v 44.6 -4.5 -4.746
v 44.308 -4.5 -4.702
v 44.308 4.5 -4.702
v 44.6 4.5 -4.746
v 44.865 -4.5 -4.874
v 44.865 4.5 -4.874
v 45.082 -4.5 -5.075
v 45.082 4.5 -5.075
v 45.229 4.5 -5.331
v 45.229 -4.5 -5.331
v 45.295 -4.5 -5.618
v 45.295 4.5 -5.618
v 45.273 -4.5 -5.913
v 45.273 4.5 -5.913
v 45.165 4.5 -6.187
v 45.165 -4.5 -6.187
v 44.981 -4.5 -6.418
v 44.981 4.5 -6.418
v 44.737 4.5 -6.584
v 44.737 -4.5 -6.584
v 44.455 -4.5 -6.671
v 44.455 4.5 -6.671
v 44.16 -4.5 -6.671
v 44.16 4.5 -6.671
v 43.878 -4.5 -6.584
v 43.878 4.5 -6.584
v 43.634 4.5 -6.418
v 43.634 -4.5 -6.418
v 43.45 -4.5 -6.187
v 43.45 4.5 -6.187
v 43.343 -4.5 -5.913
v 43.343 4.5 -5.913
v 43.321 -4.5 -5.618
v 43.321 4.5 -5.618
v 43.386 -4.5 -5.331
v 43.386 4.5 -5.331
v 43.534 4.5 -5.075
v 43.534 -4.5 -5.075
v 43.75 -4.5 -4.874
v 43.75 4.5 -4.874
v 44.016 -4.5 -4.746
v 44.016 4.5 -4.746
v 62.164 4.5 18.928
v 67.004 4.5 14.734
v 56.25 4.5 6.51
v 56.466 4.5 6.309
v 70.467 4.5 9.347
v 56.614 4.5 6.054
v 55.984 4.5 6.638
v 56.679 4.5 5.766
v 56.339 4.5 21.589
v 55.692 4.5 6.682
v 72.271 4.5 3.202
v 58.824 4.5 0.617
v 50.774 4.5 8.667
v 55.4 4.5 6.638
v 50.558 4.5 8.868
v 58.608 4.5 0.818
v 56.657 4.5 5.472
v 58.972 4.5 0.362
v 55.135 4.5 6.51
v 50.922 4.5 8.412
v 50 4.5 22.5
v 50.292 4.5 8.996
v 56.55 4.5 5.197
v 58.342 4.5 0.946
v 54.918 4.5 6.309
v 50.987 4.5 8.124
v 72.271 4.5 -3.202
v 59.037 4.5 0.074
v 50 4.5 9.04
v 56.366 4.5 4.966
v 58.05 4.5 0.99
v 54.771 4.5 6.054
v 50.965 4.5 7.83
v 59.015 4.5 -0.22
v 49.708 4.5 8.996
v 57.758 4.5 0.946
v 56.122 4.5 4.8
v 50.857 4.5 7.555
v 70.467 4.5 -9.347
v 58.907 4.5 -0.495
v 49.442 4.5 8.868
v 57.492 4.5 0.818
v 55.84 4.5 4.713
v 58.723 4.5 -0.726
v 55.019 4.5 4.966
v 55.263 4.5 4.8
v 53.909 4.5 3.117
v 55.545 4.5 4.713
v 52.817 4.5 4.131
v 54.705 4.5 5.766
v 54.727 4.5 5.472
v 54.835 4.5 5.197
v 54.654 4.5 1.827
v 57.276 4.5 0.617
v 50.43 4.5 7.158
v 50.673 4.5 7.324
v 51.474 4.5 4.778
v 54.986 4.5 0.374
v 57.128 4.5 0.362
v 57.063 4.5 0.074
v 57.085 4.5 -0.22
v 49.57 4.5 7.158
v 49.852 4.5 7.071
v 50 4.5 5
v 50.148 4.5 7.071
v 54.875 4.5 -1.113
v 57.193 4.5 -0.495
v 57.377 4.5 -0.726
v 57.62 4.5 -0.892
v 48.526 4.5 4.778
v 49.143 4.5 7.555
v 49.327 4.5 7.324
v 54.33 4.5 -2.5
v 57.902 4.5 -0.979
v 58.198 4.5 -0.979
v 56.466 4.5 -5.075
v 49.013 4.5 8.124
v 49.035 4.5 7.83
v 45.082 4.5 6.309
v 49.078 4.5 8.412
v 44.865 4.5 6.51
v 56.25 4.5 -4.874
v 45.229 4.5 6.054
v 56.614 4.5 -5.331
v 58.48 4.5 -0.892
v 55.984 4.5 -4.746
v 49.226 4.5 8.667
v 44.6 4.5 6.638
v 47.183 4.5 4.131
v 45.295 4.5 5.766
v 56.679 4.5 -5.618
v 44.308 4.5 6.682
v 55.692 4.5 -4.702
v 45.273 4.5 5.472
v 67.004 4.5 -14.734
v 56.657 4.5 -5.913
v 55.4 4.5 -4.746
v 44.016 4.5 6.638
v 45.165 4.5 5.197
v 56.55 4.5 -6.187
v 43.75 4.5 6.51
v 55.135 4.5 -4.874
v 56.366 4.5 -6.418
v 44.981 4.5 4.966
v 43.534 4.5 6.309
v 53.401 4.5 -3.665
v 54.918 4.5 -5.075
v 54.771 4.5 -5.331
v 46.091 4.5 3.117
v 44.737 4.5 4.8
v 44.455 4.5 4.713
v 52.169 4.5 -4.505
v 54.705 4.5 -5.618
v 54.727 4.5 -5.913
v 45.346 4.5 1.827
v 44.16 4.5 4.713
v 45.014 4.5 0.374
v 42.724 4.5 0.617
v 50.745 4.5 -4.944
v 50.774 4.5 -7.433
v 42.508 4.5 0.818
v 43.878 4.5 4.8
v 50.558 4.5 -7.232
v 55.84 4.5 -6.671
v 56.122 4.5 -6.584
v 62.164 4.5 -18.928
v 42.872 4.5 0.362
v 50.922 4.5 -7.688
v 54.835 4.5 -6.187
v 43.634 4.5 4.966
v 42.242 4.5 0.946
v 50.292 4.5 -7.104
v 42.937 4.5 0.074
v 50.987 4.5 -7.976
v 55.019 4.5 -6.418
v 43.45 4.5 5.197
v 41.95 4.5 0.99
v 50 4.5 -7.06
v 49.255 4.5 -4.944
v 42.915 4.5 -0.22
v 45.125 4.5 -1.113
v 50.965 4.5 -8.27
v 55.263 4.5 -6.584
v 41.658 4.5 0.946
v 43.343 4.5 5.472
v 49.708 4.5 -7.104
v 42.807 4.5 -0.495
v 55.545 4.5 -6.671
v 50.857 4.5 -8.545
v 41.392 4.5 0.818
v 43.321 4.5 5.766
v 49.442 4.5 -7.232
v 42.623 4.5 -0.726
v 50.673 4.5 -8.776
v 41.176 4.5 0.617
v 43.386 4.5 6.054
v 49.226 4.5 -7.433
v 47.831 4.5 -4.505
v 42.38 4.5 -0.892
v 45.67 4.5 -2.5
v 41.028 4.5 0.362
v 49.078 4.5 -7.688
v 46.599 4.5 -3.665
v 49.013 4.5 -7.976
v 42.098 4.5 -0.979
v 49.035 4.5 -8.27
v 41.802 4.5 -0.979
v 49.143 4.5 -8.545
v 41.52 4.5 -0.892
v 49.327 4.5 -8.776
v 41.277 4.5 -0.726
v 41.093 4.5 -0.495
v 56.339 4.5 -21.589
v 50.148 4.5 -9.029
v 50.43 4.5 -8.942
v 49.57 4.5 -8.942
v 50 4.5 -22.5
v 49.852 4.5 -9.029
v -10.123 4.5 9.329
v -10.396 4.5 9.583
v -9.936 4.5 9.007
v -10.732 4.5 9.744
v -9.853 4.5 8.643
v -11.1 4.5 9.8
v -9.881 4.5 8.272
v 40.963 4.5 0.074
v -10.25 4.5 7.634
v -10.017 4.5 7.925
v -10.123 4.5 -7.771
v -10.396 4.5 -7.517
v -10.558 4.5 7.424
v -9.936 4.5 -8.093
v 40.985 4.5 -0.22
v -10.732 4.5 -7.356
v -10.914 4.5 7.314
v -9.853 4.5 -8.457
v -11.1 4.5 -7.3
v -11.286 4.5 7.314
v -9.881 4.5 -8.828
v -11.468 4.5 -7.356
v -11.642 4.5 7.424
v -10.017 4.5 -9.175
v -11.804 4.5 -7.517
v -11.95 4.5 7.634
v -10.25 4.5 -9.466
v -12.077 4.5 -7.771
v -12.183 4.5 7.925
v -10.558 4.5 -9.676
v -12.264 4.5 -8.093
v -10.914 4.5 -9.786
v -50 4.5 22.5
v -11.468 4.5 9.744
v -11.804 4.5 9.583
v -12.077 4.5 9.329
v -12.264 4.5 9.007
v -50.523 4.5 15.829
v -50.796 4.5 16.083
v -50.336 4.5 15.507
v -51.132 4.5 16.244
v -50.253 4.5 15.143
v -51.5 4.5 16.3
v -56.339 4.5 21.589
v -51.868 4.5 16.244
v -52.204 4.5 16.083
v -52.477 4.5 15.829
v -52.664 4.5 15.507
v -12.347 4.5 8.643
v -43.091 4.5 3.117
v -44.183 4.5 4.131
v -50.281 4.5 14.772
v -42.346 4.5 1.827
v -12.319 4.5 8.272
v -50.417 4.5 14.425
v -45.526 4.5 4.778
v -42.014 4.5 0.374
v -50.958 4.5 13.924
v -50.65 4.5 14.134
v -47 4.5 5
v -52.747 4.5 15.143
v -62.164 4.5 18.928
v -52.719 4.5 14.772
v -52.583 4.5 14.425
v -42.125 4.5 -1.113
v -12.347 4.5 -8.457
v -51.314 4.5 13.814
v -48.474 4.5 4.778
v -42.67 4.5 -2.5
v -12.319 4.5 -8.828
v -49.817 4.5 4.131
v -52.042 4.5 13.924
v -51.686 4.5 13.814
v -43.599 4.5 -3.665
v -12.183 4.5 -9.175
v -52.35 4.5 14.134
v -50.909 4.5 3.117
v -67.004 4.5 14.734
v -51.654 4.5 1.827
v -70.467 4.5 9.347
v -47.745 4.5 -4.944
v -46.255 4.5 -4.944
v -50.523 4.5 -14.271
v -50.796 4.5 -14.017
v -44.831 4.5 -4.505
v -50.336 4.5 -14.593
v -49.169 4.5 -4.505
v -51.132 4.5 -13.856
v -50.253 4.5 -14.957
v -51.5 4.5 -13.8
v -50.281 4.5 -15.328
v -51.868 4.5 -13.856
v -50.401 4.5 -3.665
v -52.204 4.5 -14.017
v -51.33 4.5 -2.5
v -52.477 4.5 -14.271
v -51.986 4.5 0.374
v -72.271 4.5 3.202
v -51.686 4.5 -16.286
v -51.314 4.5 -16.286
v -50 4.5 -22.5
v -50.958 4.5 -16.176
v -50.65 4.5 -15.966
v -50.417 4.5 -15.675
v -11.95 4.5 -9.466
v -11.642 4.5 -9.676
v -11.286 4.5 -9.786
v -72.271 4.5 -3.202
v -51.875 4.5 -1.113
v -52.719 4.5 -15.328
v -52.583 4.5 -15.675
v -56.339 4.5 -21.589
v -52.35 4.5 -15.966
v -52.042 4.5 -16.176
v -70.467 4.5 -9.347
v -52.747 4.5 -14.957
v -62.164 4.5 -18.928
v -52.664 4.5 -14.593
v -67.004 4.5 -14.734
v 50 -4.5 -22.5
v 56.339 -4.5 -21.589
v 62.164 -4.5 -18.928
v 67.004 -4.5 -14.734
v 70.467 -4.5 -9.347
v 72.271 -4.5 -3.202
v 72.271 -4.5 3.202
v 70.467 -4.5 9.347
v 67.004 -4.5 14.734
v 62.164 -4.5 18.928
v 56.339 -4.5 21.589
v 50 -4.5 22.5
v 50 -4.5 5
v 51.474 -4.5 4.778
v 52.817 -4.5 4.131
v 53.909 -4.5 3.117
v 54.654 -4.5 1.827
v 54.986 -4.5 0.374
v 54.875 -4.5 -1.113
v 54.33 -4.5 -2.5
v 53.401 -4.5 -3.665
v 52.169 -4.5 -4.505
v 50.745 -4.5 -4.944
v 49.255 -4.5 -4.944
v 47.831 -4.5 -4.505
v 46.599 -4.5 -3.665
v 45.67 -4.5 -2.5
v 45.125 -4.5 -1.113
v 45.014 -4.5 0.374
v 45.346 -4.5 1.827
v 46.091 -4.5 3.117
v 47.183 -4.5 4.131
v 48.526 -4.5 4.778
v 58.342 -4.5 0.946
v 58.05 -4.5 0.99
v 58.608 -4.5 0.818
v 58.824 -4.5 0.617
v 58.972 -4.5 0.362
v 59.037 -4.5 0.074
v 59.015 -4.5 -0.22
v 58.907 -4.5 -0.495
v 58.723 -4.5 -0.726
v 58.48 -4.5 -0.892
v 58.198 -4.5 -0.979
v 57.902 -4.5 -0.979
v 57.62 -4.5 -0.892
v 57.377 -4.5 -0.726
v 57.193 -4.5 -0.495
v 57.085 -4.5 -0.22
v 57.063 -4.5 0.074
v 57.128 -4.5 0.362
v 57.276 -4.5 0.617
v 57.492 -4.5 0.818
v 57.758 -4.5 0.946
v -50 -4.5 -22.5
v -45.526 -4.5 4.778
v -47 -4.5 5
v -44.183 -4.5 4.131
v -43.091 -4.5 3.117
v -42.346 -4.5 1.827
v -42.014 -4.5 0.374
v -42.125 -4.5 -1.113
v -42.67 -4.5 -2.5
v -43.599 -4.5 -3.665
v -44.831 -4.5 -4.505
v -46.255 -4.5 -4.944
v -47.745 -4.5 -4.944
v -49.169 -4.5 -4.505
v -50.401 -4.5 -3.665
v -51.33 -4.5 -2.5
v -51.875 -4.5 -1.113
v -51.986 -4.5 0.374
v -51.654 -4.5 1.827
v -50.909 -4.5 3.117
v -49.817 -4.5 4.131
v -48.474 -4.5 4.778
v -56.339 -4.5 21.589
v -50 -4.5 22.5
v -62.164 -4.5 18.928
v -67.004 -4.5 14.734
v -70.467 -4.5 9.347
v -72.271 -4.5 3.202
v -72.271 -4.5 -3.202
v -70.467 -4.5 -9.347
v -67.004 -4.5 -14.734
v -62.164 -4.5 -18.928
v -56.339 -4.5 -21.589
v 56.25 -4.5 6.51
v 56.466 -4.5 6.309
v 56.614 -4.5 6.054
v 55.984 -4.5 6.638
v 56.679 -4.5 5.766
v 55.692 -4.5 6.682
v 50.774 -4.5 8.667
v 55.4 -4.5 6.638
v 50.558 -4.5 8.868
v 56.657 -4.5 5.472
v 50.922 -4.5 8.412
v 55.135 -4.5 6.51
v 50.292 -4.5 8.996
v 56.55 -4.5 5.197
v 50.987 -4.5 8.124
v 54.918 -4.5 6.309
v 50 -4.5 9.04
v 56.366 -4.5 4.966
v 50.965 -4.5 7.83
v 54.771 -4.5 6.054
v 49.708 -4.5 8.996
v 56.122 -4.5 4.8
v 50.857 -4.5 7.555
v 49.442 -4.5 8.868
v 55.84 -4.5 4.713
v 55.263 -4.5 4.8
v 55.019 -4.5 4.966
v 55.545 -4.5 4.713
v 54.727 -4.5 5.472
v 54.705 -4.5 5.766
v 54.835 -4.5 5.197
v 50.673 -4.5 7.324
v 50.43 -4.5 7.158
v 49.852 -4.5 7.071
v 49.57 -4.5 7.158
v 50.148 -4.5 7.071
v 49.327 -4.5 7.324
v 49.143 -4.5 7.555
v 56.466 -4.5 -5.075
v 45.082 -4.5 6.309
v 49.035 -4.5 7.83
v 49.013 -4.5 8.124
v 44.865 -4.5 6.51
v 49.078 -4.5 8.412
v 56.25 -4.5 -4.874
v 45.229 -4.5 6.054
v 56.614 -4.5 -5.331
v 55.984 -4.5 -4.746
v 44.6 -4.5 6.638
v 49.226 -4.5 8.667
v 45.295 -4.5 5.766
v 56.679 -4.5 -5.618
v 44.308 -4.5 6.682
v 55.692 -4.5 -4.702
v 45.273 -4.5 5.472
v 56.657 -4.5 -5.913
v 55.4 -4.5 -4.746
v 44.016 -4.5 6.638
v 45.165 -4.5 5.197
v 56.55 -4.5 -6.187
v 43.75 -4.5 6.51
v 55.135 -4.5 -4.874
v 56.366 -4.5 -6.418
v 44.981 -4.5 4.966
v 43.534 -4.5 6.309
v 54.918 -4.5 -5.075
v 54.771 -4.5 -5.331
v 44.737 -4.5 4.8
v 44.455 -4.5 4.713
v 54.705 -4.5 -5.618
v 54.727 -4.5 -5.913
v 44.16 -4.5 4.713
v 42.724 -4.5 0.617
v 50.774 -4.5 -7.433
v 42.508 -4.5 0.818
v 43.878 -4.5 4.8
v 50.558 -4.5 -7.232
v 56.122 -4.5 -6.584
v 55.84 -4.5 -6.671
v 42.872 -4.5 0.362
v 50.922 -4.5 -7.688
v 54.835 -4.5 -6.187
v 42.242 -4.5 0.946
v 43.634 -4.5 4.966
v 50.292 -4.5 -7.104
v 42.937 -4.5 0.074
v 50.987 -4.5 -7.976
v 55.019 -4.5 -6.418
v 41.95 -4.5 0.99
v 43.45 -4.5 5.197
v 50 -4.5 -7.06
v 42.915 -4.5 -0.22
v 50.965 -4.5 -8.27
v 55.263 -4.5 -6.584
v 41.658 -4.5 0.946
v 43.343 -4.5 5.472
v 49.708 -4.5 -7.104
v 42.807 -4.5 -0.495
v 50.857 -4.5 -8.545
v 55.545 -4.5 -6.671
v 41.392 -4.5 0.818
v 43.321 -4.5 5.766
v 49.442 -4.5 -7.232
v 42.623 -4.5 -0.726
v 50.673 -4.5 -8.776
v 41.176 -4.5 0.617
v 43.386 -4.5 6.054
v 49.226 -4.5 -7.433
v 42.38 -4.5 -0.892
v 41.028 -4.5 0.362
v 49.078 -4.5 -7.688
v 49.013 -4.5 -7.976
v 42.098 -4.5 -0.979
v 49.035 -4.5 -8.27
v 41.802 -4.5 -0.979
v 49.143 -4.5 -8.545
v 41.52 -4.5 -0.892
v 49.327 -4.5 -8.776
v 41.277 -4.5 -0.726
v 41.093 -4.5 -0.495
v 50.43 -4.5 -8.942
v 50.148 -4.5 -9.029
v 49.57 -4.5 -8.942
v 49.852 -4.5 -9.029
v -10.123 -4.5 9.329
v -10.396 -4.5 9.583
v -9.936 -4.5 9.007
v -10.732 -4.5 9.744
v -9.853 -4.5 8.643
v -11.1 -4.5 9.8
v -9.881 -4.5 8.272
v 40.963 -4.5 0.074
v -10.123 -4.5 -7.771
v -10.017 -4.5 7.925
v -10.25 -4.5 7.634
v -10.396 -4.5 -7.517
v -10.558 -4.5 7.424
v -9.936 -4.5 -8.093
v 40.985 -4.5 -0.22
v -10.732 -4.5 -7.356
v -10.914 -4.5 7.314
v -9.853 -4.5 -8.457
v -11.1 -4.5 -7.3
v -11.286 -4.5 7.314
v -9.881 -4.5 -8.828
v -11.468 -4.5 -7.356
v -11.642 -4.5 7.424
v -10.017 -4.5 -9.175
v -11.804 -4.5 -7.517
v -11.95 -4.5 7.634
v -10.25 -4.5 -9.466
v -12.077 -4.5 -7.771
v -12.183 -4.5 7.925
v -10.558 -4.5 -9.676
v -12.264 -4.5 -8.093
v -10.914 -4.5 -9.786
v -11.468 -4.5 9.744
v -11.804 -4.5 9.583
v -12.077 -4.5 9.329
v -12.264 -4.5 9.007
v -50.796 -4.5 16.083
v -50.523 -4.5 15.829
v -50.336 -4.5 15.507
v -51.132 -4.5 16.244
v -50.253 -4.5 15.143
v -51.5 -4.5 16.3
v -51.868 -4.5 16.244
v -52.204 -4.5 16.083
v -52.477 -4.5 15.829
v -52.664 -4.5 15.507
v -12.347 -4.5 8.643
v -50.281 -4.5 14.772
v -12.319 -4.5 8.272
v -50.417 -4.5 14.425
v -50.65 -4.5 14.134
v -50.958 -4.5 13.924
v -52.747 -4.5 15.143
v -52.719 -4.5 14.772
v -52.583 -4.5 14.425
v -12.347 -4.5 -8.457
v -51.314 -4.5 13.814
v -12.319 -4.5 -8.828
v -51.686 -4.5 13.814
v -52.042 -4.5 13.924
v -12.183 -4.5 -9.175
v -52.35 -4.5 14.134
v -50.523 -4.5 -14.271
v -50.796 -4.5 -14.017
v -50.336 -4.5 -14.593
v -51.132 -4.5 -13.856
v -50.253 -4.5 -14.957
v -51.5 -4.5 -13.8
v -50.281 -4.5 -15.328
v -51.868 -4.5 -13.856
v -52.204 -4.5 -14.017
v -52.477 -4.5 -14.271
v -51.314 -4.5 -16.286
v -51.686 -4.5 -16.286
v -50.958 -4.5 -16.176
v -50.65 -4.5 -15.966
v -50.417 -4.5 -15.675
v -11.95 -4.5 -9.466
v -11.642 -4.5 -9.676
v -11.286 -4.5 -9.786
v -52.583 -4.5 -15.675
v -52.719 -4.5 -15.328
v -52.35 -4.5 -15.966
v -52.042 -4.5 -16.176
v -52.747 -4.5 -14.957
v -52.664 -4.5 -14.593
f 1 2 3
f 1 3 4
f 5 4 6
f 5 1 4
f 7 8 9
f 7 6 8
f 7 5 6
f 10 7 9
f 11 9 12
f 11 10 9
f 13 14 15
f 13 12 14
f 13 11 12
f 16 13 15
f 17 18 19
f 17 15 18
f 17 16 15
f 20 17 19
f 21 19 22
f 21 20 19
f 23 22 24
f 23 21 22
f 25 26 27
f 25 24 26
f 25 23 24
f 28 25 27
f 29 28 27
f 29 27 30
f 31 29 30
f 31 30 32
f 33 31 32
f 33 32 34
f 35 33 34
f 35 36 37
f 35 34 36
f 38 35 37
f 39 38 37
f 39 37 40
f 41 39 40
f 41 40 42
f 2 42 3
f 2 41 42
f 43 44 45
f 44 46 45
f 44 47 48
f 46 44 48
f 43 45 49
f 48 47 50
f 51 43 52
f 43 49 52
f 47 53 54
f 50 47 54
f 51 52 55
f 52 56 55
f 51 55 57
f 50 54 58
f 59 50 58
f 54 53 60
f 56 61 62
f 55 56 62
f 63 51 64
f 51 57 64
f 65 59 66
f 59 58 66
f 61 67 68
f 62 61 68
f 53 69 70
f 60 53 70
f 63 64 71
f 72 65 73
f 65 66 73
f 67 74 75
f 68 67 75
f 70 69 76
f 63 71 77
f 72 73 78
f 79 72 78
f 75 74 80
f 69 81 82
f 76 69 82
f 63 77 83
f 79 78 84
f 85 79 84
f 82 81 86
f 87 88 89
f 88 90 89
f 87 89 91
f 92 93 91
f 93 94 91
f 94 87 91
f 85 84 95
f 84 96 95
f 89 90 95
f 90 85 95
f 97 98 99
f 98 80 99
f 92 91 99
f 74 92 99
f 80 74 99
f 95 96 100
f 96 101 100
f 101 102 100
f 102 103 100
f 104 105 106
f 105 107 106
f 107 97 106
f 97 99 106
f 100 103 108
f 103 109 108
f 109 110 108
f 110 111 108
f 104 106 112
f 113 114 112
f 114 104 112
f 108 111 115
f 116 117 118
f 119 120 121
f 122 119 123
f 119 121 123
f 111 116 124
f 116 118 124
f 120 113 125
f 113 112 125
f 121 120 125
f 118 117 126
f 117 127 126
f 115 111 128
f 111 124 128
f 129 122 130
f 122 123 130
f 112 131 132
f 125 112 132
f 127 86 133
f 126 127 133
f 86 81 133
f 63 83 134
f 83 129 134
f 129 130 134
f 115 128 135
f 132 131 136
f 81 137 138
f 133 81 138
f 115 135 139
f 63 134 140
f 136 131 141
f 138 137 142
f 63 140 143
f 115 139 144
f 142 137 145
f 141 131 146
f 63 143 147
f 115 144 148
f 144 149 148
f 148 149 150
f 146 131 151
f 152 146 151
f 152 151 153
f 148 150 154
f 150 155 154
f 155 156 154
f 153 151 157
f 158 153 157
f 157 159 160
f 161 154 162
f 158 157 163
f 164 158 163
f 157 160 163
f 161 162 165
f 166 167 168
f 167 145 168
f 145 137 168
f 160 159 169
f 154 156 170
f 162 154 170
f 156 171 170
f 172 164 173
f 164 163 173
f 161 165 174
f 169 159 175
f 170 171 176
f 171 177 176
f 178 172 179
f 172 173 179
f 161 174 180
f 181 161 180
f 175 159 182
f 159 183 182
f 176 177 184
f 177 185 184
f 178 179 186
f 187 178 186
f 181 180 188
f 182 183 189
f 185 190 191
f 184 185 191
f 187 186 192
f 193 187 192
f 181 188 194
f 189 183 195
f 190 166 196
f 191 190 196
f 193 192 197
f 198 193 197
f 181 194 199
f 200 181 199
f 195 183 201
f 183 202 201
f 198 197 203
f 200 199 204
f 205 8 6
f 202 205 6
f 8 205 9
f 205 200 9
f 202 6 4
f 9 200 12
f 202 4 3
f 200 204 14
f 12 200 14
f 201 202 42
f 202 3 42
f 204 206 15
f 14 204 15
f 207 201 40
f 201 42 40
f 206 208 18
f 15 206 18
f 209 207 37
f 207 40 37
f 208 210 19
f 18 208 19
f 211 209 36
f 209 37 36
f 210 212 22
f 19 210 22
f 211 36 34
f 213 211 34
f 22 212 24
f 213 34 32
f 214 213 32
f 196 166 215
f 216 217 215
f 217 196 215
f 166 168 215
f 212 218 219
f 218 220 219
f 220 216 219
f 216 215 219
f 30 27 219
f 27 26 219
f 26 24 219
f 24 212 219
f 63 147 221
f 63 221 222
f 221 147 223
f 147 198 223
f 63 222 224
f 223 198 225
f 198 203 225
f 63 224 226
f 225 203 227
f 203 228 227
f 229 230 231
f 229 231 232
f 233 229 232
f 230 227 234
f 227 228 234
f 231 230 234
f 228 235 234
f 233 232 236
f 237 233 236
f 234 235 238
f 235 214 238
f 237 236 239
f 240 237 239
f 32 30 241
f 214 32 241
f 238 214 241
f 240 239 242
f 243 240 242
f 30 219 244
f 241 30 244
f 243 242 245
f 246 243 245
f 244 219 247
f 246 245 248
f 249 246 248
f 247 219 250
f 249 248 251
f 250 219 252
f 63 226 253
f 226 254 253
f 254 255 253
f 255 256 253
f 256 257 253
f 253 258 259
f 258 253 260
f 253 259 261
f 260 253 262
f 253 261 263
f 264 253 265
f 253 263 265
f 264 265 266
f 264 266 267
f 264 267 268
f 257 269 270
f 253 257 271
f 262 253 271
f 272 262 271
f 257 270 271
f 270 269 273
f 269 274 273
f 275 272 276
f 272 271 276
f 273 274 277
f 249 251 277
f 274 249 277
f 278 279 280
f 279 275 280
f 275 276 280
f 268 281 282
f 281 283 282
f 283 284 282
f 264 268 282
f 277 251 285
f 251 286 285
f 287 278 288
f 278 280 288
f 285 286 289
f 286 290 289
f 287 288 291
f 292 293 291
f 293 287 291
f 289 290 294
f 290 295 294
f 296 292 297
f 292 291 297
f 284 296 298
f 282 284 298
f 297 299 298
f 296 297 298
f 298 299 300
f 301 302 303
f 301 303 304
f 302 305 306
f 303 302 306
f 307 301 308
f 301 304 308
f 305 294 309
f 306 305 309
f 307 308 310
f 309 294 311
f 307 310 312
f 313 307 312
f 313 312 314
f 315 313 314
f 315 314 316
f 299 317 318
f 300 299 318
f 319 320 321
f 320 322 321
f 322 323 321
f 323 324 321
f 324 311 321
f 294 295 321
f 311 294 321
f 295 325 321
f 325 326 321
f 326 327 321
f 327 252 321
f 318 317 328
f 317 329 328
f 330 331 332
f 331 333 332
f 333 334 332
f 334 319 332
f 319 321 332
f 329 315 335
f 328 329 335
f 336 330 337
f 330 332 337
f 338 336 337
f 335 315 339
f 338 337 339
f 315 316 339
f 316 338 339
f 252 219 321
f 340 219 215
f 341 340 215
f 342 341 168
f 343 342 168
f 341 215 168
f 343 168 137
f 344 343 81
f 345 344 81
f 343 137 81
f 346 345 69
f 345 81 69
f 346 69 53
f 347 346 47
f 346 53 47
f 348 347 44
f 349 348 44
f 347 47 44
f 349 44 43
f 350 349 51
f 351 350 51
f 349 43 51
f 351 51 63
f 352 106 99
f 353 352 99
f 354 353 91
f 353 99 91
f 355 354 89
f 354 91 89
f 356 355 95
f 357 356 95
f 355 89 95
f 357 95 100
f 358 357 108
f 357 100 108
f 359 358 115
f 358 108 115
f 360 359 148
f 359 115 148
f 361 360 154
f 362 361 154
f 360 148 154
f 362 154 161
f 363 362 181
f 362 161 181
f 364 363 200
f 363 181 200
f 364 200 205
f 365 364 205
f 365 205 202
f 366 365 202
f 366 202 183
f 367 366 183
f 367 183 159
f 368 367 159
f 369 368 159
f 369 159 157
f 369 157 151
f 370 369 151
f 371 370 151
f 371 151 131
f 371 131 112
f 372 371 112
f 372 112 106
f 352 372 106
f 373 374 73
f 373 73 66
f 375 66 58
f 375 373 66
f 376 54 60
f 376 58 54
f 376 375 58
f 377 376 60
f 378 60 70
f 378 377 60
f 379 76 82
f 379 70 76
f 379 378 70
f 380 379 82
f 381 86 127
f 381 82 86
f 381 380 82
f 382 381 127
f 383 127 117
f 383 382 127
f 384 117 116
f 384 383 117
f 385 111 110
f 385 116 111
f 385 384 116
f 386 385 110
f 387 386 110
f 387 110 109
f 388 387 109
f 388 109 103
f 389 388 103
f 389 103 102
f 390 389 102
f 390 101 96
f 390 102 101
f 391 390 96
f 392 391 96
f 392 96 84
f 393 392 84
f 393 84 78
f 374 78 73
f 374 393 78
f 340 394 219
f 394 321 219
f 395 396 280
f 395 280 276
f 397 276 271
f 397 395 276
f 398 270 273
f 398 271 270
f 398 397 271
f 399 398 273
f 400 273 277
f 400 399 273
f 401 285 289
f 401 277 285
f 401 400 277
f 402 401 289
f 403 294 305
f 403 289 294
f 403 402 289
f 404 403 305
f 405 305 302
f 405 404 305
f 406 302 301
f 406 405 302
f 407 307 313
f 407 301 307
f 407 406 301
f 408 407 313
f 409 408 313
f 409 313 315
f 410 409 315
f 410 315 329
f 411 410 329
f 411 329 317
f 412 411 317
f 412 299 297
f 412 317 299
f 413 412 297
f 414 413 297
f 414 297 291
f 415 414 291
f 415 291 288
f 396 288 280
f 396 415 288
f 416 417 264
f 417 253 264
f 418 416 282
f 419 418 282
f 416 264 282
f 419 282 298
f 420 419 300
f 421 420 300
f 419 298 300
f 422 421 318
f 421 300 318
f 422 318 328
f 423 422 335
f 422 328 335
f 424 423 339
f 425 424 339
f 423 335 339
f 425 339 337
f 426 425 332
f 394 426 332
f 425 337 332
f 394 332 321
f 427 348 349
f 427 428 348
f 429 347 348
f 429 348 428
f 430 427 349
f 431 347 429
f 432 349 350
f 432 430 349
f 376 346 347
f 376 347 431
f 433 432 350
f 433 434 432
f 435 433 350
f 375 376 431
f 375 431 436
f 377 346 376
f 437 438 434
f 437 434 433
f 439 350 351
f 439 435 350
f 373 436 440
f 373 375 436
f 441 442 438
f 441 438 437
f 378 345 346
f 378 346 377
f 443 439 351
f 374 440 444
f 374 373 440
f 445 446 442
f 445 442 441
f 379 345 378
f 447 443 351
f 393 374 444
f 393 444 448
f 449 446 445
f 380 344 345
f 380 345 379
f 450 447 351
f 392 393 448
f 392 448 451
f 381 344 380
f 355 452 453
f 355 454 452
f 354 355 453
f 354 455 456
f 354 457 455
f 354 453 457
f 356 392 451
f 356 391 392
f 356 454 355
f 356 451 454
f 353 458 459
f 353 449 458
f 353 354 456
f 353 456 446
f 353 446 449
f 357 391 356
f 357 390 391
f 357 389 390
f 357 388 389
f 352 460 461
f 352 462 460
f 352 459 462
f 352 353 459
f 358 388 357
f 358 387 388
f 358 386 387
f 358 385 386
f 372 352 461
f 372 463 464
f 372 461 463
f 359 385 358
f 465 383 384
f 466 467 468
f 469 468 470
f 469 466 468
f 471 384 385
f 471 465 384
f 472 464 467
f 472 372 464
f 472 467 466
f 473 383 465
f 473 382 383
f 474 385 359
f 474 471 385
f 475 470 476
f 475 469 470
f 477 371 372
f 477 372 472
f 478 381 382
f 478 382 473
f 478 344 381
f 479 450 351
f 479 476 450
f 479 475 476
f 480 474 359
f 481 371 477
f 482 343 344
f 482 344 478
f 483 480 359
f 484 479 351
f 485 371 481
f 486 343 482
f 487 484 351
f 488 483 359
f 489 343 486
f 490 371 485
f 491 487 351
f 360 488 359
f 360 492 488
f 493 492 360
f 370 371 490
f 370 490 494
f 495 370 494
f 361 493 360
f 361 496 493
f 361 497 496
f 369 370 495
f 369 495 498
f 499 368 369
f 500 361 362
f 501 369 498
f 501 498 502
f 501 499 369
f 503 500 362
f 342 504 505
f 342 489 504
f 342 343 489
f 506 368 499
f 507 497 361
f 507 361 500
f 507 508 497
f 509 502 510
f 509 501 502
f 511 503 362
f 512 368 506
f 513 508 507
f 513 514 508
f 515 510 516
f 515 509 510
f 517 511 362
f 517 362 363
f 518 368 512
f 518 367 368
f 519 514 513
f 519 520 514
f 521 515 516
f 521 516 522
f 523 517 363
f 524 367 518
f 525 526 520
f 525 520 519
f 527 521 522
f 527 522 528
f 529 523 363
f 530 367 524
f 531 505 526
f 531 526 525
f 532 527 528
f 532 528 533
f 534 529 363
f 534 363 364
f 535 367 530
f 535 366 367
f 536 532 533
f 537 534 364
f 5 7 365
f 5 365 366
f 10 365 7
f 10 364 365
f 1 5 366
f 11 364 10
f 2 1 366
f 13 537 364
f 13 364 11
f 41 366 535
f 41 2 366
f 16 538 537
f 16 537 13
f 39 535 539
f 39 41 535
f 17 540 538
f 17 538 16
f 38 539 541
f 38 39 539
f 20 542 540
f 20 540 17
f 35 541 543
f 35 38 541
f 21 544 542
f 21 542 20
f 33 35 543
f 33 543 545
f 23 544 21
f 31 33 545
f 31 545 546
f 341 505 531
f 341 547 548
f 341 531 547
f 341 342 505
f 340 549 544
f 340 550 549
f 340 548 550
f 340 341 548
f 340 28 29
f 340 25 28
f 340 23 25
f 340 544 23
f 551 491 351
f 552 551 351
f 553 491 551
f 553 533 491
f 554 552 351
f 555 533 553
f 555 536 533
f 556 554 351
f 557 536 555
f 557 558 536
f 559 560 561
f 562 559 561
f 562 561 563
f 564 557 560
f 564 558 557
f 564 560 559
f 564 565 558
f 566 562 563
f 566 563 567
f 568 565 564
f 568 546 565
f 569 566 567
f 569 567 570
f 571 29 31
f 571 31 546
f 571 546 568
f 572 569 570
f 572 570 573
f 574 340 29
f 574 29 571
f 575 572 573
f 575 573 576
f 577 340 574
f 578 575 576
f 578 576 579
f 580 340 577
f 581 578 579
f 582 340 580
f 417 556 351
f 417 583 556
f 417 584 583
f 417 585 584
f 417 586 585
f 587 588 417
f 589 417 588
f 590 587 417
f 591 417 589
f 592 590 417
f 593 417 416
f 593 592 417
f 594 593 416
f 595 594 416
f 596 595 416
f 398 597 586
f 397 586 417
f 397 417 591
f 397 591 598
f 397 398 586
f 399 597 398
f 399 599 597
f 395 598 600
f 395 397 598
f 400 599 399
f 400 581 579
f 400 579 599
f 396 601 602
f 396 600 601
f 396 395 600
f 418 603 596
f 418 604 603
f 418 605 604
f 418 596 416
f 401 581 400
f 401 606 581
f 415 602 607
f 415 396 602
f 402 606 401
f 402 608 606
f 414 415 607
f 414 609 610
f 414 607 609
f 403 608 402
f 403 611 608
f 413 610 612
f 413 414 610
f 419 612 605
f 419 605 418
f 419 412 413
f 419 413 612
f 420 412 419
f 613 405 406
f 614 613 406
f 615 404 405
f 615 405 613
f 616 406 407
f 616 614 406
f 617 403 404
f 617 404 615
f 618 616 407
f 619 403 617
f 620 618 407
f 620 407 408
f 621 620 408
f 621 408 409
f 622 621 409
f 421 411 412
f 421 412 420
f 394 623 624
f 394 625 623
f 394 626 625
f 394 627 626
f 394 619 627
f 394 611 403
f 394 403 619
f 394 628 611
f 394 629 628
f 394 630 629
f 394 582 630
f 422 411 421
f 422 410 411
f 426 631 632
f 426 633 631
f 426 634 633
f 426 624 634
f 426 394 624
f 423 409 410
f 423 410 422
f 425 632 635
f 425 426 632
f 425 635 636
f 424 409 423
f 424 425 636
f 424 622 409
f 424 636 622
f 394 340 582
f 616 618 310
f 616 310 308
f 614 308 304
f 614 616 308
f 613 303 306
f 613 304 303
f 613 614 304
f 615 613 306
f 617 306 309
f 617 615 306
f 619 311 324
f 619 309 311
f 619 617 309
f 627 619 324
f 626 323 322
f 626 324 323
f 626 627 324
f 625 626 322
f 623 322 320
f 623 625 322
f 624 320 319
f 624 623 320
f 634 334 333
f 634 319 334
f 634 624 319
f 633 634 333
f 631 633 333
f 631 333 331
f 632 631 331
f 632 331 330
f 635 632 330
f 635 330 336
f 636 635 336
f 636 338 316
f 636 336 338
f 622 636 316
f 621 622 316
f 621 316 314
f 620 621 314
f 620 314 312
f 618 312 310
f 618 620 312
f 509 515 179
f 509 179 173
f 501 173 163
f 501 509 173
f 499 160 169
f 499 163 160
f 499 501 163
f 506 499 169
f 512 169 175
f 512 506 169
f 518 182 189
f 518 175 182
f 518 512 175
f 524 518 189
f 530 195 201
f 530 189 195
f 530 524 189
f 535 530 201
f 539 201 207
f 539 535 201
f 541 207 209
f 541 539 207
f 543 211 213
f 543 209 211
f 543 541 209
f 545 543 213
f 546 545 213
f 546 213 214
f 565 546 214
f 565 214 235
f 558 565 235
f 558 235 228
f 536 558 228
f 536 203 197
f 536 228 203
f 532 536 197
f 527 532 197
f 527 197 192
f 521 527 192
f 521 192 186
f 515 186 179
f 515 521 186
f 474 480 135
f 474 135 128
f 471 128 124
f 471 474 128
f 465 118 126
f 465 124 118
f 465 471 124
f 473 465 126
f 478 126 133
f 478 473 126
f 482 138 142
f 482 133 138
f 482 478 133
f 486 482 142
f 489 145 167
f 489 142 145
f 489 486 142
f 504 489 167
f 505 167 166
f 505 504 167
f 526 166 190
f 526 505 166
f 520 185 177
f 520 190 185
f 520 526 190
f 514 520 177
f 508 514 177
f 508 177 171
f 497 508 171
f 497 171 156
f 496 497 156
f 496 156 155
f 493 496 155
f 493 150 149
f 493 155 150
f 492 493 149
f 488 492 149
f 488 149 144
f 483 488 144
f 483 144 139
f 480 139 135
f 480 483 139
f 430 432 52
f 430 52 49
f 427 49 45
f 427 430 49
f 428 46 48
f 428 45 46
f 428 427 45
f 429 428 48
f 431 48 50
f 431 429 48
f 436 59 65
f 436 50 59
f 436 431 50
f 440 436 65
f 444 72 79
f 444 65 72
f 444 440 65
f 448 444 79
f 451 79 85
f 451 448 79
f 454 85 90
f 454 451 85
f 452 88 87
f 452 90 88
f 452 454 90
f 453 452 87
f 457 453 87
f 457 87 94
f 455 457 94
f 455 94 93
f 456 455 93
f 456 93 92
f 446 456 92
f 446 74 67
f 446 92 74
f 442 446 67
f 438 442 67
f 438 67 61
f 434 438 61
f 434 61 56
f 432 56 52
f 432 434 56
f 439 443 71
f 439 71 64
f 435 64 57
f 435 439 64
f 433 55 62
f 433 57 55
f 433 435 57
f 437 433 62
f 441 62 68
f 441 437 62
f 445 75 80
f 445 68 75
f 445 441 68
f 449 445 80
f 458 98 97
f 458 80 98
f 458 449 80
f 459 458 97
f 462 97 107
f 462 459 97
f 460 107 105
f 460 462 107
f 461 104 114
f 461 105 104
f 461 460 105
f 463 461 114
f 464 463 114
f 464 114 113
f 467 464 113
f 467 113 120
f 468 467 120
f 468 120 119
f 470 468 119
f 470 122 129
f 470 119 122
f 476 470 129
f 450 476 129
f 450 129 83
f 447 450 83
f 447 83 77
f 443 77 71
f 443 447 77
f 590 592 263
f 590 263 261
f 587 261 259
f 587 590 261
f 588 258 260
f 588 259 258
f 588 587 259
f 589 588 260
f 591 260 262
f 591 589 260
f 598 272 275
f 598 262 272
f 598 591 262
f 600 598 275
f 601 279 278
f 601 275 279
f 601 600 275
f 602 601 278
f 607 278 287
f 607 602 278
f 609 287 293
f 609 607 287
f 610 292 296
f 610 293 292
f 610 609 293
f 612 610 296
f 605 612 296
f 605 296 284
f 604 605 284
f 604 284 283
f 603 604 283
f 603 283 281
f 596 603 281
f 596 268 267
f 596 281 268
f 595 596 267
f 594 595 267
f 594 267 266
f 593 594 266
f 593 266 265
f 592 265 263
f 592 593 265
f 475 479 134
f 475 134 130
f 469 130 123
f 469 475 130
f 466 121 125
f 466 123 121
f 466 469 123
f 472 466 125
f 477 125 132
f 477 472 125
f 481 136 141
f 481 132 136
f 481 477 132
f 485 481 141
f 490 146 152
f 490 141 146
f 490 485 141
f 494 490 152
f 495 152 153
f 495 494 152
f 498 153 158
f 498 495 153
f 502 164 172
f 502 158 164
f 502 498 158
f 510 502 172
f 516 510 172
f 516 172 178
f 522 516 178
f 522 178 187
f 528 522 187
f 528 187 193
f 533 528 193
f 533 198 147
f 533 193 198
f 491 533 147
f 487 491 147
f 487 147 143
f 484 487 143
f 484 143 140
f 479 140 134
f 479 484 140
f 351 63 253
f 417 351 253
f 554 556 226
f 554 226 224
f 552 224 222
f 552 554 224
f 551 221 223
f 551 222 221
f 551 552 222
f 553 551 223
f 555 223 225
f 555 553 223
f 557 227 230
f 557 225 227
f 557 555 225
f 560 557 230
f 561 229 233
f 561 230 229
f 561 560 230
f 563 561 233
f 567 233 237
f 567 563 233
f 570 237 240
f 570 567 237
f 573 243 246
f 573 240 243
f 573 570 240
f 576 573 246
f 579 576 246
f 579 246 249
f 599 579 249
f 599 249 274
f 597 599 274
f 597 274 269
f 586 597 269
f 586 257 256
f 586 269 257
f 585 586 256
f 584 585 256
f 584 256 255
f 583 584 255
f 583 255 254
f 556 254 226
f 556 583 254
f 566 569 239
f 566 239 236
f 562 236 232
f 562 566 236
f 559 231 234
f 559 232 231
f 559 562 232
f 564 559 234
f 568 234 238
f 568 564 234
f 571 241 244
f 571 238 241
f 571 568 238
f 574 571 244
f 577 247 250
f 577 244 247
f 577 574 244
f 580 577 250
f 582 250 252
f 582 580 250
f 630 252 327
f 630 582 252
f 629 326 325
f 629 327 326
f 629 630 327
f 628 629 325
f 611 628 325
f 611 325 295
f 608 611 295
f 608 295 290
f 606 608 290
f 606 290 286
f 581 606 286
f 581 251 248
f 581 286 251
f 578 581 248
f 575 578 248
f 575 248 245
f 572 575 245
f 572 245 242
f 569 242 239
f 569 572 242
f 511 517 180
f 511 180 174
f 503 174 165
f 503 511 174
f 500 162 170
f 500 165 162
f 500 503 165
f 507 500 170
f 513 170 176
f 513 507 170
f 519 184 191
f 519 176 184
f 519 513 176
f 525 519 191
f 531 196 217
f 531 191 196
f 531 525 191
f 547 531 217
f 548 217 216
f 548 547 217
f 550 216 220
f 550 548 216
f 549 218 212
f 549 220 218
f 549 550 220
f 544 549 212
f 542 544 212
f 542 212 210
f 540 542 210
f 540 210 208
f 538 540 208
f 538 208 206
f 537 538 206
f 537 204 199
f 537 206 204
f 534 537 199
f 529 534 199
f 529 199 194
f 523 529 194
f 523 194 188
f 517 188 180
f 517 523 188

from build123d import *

# Parameters (mm, degrees)
BOSS_EXTRUDE1_DEPTH     = 4.5
CUT_EXTRUDE1_DEPTH      = 77.442789065
CUT_EXTRUDE1_DEPTH_BACK = 77.442789065
SKETCH3_R               = 0.99
SKETCH4_R               = 5
CUT_EXTRUDE2_DEPTH      = 77.442789065
CUT_EXTRUDE3_DEPTH      = 77.442789065
CUT_EXTRUDE3_DEPTH_BACK = 77.442789065
SKETCH5_R               = 1.25
SKETCH5_R_2             = 5


with BuildPart() as part:
    # Sketch2 → Boss-Extrude1 (new, symmetric)
    with BuildSketch(Plane(origin=(0, 0, 0), x_dir=(1, 0, 0), z_dir=(0, 1, 0))):
        with BuildLine():
            Line((50, -22.5), (-50, -22.5))
            ThreePointArc((-50, -22.5), (-72.5, 0), (-50, 22.5))
            Line((-50, 22.5), (50, 22.5))
            ThreePointArc((50, 22.5), (72.5, 0), (50, -22.5))
        make_face()
    extrude(amount=BOSS_EXTRUDE1_DEPTH, both=True)

    # Sketch3 → Cut-Extrude1 (cut, two sides: drawn at the far end of the back side and taken through both)
    with BuildSketch(Plane(origin=(0, 4.5, 0), x_dir=(1, 0, 0), z_dir=(0, 1, 0)).offset(-CUT_EXTRUDE1_DEPTH_BACK)):
        with Locations(Location((41.95, 0, 0), (0, 0, 270))):
            Circle(SKETCH3_R)
        with Locations(Location((44.307790411, 5.692209589, 0), (0, 0, 270))):
            Circle(SKETCH3_R)
        with Locations(Location((50, 8.05, 0), (0, 0, 270))):
            Circle(SKETCH3_R)
        with Locations(Location((55.692209589, 5.692209589, 0), (0, 0, 270))):
            Circle(SKETCH3_R)
        with Locations(Location((58.05, 0, 0), (0, 0, 270))):
            Circle(SKETCH3_R)
        with Locations(Location((55.692209589, -5.692209589, 0), (0, 0, 270))):
            Circle(SKETCH3_R)
        with Locations(Location((50, -8.05, 0), (0, 0, 270))):
            Circle(SKETCH3_R)
        with Locations(Location((44.307790411, -5.692209589, 0), (0, 0, 270))):
            Circle(SKETCH3_R)
    extrude(amount=CUT_EXTRUDE1_DEPTH + CUT_EXTRUDE1_DEPTH_BACK, mode=Mode.SUBTRACT)

    # Sketch4 → Cut-Extrude2 (cut, through all)
    with BuildSketch(Plane(origin=(0, 4.5, 0), x_dir=(1, 0, 0), z_dir=(0, 1, 0))):
        with Locations(Location((50, 0, 0), (0, 0, 270))):
            Circle(SKETCH4_R)
    extrude(amount=-CUT_EXTRUDE2_DEPTH, mode=Mode.SUBTRACT)

    # Sketch5 → Cut-Extrude3 (cut, two sides: drawn at the far end of the back side and taken through both)
    with BuildSketch(Plane(origin=(0, 4.5, 0), x_dir=(1, 0, 0), z_dir=(0, 1, 0)).offset(-CUT_EXTRUDE3_DEPTH_BACK)):
        with Locations(Location((-51.5, -15.05, 0), (0, 0, 270))):
            Circle(SKETCH5_R)
        with Locations(Location((-51.5, 15.05, 0), (0, 0, 270))):
            Circle(SKETCH5_R)
        with Locations(Location((-11.1, 8.55, 0), (0, 0, 270))):
            Circle(SKETCH5_R)
        with Locations(Location((-11.1, -8.55, 0), (0, 0, 270))):
            Circle(SKETCH5_R)
        with Locations(Location((-47, 0, 0), (0, 0, 270))):
            Circle(SKETCH5_R_2)
    extrude(amount=CUT_EXTRUDE3_DEPTH + CUT_EXTRUDE3_DEPTH_BACK, mode=Mode.SUBTRACT)


solid = part.part
